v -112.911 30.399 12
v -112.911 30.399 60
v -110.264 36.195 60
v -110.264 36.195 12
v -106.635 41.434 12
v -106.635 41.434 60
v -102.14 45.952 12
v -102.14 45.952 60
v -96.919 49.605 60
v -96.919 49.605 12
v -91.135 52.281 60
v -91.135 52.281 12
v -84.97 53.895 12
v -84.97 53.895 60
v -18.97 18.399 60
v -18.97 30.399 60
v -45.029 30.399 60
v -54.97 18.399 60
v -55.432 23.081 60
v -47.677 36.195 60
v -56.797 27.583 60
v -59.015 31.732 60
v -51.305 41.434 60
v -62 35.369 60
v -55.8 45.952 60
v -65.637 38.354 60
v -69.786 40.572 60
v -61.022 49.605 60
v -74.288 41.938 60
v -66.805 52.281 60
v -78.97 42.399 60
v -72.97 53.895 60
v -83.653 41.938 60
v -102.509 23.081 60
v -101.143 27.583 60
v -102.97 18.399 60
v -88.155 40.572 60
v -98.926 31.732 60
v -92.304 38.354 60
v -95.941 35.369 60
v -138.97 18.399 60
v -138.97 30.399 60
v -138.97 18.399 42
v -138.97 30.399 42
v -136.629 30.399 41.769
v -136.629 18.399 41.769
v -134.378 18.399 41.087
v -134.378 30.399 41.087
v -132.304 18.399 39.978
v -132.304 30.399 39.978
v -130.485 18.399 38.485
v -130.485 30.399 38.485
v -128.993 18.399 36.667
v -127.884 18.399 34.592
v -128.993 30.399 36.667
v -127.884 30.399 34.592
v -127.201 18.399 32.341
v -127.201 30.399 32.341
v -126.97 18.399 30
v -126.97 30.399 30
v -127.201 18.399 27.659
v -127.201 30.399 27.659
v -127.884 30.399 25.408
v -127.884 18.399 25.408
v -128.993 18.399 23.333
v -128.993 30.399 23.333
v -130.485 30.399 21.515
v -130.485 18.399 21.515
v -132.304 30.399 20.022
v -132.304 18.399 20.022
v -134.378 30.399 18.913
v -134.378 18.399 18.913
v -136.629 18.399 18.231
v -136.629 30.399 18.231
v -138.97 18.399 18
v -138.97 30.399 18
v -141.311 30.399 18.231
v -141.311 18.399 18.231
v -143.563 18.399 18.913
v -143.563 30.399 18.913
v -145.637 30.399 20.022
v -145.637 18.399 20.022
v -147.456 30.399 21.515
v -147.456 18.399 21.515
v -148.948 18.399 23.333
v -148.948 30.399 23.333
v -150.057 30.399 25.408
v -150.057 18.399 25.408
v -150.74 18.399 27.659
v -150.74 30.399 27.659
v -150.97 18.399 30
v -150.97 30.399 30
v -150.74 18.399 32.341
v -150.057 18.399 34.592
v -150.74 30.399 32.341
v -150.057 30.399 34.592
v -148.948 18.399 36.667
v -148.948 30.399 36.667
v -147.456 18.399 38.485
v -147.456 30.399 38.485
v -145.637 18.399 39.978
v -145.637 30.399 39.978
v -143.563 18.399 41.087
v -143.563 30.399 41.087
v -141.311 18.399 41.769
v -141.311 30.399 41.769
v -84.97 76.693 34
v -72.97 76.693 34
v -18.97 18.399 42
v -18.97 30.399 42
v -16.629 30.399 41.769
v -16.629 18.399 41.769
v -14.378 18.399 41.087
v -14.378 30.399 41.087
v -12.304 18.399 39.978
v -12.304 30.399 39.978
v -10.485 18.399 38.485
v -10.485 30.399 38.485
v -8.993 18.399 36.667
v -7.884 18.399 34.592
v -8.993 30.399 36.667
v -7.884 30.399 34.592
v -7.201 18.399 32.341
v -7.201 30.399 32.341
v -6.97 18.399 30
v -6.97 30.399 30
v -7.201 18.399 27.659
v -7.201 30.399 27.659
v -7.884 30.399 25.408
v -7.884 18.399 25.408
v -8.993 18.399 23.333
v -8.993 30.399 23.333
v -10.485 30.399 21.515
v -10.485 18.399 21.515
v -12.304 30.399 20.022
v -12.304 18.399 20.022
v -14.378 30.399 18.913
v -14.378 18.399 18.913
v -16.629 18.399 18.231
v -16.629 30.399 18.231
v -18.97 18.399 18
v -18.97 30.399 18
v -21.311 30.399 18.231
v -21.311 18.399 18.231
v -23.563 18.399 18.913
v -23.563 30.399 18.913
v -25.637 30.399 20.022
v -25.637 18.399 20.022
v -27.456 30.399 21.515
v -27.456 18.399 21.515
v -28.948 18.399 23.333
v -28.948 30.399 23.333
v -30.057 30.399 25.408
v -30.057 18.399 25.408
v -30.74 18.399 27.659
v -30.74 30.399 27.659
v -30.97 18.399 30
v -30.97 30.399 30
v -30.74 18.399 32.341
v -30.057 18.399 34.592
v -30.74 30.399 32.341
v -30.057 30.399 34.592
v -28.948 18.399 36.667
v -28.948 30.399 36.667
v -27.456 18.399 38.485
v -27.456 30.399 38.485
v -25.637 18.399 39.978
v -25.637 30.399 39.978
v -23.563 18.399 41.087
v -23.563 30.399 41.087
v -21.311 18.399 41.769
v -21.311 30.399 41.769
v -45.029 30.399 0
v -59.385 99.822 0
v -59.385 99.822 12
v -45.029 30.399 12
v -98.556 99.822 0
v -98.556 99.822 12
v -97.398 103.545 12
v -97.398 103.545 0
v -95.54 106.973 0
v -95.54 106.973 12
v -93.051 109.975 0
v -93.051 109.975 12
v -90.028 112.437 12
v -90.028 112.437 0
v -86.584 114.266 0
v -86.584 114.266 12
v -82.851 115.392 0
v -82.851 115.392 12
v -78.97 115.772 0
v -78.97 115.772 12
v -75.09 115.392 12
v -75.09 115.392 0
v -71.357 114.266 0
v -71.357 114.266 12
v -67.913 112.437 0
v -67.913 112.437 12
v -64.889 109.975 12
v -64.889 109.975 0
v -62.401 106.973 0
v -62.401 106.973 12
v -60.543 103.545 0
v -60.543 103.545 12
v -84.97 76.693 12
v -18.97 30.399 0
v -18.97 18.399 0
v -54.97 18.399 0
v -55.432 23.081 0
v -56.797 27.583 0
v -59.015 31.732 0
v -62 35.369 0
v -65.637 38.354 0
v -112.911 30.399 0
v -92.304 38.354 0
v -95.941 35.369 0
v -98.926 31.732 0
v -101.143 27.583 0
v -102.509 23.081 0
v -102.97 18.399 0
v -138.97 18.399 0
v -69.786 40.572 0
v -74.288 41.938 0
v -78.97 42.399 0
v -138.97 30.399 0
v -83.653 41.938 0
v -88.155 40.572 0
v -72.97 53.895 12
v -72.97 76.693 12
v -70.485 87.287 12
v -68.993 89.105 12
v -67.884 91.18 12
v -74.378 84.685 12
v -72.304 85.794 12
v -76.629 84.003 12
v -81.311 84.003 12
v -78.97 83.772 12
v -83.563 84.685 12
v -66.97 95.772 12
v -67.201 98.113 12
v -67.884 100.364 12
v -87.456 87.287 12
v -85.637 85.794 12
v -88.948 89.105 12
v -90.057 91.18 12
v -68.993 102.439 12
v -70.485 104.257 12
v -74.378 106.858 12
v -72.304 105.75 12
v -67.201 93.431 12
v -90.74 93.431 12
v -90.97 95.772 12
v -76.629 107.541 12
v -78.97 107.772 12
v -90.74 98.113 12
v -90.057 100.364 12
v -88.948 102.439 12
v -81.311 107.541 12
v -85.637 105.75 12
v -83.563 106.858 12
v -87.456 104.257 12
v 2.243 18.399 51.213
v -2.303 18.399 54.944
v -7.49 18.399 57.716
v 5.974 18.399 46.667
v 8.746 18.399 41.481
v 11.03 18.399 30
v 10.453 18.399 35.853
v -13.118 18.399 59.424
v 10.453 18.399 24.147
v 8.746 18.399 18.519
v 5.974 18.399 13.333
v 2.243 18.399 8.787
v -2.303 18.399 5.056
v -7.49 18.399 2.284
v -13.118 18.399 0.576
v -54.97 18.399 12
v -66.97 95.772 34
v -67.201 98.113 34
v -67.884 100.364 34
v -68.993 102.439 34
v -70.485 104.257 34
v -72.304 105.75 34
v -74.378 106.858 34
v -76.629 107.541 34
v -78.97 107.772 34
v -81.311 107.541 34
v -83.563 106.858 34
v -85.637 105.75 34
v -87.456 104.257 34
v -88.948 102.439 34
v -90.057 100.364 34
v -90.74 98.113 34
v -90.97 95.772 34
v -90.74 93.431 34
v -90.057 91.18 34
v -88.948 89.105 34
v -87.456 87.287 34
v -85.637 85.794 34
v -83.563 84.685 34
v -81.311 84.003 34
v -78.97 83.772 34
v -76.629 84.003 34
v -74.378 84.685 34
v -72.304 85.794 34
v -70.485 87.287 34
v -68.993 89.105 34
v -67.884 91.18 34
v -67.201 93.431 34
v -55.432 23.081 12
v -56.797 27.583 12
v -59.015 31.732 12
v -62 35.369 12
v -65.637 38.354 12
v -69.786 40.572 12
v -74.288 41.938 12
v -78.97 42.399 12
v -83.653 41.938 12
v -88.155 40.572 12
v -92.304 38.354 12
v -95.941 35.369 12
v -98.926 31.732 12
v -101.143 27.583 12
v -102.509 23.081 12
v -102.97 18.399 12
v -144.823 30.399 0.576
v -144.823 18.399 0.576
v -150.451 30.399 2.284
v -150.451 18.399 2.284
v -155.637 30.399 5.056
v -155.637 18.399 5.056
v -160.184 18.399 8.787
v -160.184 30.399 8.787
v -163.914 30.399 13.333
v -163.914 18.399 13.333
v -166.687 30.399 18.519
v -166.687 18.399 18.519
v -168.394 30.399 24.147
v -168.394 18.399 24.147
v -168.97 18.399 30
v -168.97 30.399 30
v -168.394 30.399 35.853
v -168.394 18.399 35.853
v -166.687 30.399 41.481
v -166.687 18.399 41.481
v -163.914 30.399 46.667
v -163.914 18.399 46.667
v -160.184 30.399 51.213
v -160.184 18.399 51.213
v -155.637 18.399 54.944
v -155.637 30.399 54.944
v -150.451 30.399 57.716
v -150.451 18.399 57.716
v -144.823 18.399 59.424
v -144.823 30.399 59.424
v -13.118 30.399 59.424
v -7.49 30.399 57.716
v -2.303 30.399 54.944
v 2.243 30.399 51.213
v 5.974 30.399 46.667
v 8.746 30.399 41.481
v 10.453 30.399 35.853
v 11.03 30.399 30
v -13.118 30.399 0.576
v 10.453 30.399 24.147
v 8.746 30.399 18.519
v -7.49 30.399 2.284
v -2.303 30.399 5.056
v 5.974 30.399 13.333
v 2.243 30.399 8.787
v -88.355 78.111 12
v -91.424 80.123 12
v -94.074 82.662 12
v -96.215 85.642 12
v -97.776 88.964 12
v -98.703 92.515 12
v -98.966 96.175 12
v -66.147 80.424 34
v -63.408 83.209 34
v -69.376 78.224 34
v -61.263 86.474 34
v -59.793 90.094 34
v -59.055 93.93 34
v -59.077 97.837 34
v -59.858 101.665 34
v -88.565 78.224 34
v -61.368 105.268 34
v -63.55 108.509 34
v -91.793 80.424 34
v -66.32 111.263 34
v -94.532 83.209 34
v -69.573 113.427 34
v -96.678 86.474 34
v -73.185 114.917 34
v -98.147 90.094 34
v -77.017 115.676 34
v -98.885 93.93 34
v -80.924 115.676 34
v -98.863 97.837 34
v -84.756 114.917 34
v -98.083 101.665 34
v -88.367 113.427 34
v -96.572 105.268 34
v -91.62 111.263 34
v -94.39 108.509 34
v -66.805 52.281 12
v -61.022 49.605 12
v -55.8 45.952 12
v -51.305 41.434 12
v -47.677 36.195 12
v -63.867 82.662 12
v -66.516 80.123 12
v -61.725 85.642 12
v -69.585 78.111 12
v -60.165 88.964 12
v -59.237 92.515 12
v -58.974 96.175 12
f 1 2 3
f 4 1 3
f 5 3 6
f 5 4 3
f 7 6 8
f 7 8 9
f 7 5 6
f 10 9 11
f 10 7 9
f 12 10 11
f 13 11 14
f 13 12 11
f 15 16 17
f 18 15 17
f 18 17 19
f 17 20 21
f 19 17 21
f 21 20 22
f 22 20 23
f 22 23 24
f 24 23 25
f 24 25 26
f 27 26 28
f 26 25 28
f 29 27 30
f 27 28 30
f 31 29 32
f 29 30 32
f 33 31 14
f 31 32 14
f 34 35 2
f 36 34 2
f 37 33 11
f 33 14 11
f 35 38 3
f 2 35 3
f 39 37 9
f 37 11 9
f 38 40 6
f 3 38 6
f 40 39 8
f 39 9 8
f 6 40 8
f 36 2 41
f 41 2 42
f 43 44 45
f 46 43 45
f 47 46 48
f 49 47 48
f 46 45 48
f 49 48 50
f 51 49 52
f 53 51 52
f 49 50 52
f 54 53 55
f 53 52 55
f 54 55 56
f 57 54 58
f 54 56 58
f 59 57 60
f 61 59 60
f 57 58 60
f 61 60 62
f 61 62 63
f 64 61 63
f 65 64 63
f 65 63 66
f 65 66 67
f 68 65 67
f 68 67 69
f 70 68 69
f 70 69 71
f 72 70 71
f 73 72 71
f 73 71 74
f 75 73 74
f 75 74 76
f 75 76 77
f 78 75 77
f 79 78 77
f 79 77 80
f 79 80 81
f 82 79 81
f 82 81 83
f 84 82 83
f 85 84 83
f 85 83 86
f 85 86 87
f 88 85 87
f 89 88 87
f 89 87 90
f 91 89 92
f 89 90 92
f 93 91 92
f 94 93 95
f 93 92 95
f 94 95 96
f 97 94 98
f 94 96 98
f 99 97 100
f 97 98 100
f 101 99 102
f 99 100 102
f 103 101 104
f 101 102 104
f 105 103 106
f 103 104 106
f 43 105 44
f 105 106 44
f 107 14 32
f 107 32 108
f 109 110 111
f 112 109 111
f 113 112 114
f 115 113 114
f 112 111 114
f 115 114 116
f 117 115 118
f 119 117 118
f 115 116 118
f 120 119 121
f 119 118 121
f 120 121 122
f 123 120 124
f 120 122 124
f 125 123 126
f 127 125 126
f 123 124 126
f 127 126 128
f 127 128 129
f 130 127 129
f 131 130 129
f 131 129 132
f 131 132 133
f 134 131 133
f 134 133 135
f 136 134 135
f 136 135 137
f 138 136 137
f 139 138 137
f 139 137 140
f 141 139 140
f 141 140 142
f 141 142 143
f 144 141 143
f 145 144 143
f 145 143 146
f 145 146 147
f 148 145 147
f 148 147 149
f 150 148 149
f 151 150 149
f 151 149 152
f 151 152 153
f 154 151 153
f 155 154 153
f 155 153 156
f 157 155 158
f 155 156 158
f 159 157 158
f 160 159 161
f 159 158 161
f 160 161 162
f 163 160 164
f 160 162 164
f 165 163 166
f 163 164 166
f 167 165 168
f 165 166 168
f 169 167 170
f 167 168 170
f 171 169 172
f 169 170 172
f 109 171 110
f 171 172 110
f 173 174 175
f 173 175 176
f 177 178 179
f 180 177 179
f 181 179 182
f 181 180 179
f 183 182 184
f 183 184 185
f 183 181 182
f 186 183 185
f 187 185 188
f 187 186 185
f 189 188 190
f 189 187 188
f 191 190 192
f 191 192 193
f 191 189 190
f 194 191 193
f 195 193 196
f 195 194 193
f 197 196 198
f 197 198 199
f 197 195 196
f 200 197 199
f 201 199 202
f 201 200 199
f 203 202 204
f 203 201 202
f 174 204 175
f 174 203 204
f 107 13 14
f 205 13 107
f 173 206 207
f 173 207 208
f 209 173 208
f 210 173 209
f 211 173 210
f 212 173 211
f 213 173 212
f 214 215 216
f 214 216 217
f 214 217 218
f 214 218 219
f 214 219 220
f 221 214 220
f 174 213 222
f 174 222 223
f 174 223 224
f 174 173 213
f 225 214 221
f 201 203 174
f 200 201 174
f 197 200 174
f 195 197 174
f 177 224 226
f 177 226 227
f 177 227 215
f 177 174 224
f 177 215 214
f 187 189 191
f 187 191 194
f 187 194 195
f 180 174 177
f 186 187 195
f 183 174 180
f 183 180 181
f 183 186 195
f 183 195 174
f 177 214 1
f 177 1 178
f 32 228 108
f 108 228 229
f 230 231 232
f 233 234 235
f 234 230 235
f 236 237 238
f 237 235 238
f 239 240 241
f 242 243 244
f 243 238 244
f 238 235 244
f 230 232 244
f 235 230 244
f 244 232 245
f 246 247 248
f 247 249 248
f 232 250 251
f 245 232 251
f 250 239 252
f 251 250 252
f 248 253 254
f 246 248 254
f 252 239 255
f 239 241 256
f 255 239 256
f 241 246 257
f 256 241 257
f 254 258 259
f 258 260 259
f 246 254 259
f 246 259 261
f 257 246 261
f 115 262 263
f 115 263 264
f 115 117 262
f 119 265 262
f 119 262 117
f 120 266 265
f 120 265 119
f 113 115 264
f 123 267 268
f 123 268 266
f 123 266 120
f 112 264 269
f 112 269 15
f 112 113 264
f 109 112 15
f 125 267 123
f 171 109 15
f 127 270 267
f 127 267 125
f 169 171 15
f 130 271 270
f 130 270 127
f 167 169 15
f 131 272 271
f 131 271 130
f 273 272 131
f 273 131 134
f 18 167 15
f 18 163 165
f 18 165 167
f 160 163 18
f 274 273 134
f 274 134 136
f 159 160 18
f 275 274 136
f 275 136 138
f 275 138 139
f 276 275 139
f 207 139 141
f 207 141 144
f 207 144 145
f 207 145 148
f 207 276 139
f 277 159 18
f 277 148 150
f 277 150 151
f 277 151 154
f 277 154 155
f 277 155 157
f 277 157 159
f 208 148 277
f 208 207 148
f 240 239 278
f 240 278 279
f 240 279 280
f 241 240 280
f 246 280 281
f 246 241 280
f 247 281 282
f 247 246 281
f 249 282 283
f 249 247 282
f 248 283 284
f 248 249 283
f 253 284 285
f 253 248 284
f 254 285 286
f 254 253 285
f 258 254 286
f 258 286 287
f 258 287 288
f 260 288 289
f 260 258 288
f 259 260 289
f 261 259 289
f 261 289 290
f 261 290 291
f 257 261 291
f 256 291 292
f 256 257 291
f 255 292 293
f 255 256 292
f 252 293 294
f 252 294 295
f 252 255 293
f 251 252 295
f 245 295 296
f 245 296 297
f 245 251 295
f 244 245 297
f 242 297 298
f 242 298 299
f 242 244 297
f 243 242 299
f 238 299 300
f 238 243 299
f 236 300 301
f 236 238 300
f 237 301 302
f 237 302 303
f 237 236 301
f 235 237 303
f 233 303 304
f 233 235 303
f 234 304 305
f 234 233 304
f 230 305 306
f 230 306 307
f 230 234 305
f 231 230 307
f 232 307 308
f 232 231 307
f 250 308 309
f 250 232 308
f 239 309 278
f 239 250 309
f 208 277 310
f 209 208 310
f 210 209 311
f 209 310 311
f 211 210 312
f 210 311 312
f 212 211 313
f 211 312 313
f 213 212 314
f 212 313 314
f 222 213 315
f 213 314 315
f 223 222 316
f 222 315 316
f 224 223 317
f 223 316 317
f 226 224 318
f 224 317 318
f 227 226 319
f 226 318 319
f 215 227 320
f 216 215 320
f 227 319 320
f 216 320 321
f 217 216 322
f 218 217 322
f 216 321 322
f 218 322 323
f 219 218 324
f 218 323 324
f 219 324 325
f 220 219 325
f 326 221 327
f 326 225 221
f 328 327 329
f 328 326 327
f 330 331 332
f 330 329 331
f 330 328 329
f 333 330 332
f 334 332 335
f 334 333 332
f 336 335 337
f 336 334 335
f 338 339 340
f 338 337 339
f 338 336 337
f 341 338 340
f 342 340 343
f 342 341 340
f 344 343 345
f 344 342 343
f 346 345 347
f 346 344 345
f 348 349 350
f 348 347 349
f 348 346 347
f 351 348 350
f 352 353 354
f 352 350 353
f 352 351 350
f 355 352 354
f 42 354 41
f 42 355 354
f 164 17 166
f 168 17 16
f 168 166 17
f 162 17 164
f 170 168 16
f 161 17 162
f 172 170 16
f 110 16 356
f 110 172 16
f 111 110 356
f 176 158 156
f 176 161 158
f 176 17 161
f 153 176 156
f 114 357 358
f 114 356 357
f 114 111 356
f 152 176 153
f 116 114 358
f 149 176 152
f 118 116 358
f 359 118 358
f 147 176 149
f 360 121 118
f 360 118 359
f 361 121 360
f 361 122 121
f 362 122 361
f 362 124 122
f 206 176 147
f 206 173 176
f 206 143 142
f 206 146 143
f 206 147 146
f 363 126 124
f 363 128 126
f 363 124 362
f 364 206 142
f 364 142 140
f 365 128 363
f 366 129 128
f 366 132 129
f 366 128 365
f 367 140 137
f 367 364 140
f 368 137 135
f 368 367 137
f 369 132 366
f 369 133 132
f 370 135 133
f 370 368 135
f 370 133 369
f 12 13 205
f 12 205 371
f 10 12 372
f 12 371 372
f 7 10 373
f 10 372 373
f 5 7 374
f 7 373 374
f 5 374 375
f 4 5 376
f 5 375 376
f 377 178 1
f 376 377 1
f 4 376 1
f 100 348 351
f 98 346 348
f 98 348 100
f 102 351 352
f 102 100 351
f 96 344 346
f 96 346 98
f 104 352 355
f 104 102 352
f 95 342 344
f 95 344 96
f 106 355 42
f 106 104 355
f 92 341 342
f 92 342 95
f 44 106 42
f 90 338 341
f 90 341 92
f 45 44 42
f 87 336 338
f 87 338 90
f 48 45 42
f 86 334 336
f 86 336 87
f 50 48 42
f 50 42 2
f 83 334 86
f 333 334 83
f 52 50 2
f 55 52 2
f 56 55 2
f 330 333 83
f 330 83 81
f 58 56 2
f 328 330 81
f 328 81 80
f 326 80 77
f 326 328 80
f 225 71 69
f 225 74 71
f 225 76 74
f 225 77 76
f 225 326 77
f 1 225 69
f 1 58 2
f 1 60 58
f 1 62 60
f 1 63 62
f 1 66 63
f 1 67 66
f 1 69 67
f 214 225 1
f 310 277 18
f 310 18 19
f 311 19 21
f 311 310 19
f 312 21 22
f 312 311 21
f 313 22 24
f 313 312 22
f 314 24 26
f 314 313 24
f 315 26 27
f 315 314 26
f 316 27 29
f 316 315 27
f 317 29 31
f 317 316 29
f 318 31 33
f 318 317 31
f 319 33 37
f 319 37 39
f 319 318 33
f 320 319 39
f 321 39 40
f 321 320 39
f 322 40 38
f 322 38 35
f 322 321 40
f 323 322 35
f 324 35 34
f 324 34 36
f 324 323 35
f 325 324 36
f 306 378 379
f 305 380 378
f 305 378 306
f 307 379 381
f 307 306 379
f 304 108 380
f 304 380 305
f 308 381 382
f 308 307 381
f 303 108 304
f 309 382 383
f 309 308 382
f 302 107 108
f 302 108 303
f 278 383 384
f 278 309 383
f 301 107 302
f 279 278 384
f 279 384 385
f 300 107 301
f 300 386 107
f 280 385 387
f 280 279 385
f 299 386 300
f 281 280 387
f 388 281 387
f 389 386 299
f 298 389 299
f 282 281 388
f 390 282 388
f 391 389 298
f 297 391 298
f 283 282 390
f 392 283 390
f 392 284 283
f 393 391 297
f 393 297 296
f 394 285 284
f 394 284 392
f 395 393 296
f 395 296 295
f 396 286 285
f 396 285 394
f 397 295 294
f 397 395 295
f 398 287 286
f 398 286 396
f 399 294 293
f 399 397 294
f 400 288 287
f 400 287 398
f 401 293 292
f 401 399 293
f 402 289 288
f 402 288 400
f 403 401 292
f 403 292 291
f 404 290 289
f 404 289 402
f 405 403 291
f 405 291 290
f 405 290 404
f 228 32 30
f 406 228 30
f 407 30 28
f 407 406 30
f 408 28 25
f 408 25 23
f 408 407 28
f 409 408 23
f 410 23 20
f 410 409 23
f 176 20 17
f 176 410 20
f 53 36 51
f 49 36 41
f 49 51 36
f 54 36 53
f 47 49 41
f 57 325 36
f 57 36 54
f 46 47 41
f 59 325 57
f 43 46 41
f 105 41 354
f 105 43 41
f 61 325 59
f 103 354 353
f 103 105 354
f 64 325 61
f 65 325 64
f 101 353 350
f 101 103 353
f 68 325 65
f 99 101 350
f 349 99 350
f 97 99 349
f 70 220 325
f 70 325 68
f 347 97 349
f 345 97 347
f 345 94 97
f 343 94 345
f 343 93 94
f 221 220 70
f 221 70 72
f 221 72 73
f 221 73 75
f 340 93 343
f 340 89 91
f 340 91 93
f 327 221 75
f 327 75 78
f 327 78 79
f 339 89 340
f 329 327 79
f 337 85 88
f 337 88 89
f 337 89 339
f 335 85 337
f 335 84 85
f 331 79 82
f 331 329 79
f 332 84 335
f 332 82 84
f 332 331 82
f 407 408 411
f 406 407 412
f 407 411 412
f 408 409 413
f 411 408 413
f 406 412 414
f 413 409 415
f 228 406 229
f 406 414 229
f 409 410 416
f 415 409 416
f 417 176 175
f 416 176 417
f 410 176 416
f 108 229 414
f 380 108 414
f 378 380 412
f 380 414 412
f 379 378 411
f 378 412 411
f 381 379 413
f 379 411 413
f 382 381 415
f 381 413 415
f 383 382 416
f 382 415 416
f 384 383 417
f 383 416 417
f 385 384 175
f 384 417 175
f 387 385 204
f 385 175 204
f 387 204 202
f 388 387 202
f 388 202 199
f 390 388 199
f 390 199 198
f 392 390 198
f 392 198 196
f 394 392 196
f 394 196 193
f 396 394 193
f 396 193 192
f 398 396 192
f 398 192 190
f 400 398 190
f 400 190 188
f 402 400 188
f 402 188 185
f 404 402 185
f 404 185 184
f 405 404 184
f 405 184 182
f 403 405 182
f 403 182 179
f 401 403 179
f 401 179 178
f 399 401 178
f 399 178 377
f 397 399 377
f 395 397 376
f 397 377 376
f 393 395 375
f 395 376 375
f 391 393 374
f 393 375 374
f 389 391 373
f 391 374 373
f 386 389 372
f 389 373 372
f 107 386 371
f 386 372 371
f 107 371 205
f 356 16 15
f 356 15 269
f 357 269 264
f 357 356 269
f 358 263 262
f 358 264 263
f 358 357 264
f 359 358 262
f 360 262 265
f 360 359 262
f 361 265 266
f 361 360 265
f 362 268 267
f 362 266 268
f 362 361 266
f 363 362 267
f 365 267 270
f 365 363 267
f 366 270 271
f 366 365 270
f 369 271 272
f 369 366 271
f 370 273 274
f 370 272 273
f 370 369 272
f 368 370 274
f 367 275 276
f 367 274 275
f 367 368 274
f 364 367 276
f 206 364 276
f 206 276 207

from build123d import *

# Parameters (mm, degrees)
Y_KSEKLIK_EKSTR_ZYON1_DEPTH = 60
RADYUS1_RADIUS              = 30
RADYUS1_LENGTH              = 12
RADYUS2_RADIUS              = 30
RADYUS2_LENGTH              = 12
IZIM3_R                     = 12
KES_EKSTR_ZYON1_DEPTH       = 181.906004531
Y_KSEKLIK_EKSTR_ZYON2_DEPTH = 12
IZIM5_R                     = 20
IZIM5_R_2                   = 12
Y_KSEKLIK_EKSTR_ZYON3_DEPTH = 22
IZIM7_W                     = 12
IZIM7_H                     = 29.711788784
Y_KSEKLIK_EKSTR_ZYON6_DEPTH = 48
KES_EKSTR_ZYON2_DEPTH       = 162.92325206
IZIM9_R                     = 24
KES_EKSTR_ZYON3_DEPTH       = 211.376144164


with BuildPart() as part:
    # Çizim1 → Yükseklik-Ekstrüzyon1 (new body)
    with BuildSketch(Plane.XY):
        with BuildLine():
            Line((-102.970359754, 18.398808471), (-168.970359754, 18.398808471))
            Line((-168.970359754, 18.398808471), (-168.970359754, 30.398808471))
            Line((-168.970359754, 30.398808471), (-112.911485251, 30.398808471))
            ThreePointArc((-112.911485251, 30.398808471), (-78.970359754, 54.398808471), (-45.029234257, 30.398808471))
            Line((-45.029234257, 30.398808471), (11.029640246, 30.398808471))
            Line((11.029640246, 30.398808471), (11.029640246, 18.398808471))
            Line((11.029640246, 18.398808471), (-54.970359754, 18.398808471))
            ThreePointArc((-54.970359754, 18.398808471), (-78.970359754, 42.398808471), (-102.970359754, 18.398808471))
        make_face()
    extrude(amount=Y_KSEKLIK_EKSTR_ZYON1_DEPTH)

    # Radyus1: full round fillet: the end face becomes a half cylinder, R = half its width
    radyus1_face = Plane((-168.970359754, 24.398808471, 30), x_dir=(0, 1, 0), z_dir=(-1, 0, 0))  # on the end face: x along it, z out of the body
    radyus1_slab = radyus1_face.offset(-RADYUS1_RADIUS / 2) * Box(RADYUS1_LENGTH, 2 * RADYUS1_RADIUS, RADYUS1_RADIUS, mode=Mode.PRIVATE)  # the body's end, R deep
    radyus1_round = Plane((-138.970359754, 24.398808471, 30), x_dir=(-1, 0, 0), z_dir=(0, 1, 0)) * Cylinder(RADYUS1_RADIUS, RADYUS1_LENGTH, mode=Mode.PRIVATE)  # its axis R under the face
    add(radyus1_slab - radyus1_round, mode=Mode.SUBTRACT)

    # Radyus2: full round fillet: the end face becomes a half cylinder, R = half its width
    radyus2_face = Plane((11.029640246, 24.398808471, 30), x_dir=(0, 1, 0), z_dir=(1, 0, 0))  # on the end face: x along it, z out of the body
    radyus2_slab = radyus2_face.offset(-RADYUS2_RADIUS / 2) * Box(RADYUS2_LENGTH, 2 * RADYUS2_RADIUS, RADYUS2_RADIUS, mode=Mode.PRIVATE)  # the body's end, R deep
    radyus2_round = Plane((-18.970359754, 24.398808471, 30), x_dir=(1, 0, 0), z_dir=(0, 1, 0)) * Cylinder(RADYUS2_RADIUS, RADYUS2_LENGTH, mode=Mode.PRIVATE)  # its axis R under the face
    add(radyus2_slab - radyus2_round, mode=Mode.SUBTRACT)

    # Çizim3 → Kes-Ekstrüzyon1 (cut, through all)
    with BuildSketch(Plane(origin=(0, 30.398808471, 0), x_dir=(1, 0, 0), z_dir=(0, 1, 0))):
        with Locations(Location((-138.970359754, -30, 0), (0, 0, 270))):
            Circle(IZIM3_R)
        with Locations(Location((-18.970359754, -30, 0), (0, 0, 270))):
            Circle(IZIM3_R)
    extrude(amount=-KES_EKSTR_ZYON1_DEPTH, mode=Mode.SUBTRACT)

    # Çizim4 → Yükseklik-Ekstrüzyon2 (add)
    with BuildSketch(Plane(origin=(0, 0, 0), x_dir=(-1, 0, 0), z_dir=(0, 0, -1))):
        with BuildLine():
            Line((59.384707946, 99.821897357), (45.029234257, 30.398808471))
            Line((45.029234257, 30.398808471), (45.029234257, 18.398808471))
            Line((45.029234257, 18.398808471), (112.911485251, 18.398808471))
            Line((112.911485251, 18.398808471), (112.911485251, 30.398808471))
            Line((112.911485251, 30.398808471), (98.556011563, 99.821897357))
            ThreePointArc((98.556011563, 99.821897357), (78.970359754, 115.771929058), (59.384707946, 99.821897357))
        make_face()
    extrude(amount=-Y_KSEKLIK_EKSTR_ZYON2_DEPTH)

    # Çizim5 → Yükseklik-Ekstrüzyon3 (add)
    with BuildSketch(Plane.XY.offset(12)):
        with Locations(Location((-78.970359754, 95.771929058, 0), (0, 0, 168.316902305))):
            Circle(IZIM5_R)
        with Locations((-78.970359754, 95.771929058)):
            Circle(IZIM5_R_2, mode=Mode.SUBTRACT)
    extrude(amount=Y_KSEKLIK_EKSTR_ZYON3_DEPTH)

    # Çizim7 → Yükseklik-Ekstrüzyon6 (add)
    with BuildSketch(Plane.XY.offset(12)):
        with Locations((-78.970359754, 64.368074617)):
            Rectangle(IZIM7_W, IZIM7_H)
    extrude(amount=Y_KSEKLIK_EKSTR_ZYON6_DEPTH)

    # Çizim8 → Kes-Ekstrüzyon2 (cut, through all)
    with BuildSketch(Plane.ZY.offset(84.970359754)):
        Polygon((34, 76.693145029), (34, 79.223969009), (60, 79.223969009), (60, 53.895287169), align=None)
    extrude(amount=-KES_EKSTR_ZYON2_DEPTH, mode=Mode.SUBTRACT)

    # Çizim9 → Kes-Ekstrüzyon3 (cut, through all)
    with BuildSketch(Plane.XY.offset(12)):
        with Locations((-78.970359754, 18.398808471)):
            Circle(IZIM9_R)
    extrude(amount=-KES_EKSTR_ZYON3_DEPTH, mode=Mode.SUBTRACT)


solid = part.part
